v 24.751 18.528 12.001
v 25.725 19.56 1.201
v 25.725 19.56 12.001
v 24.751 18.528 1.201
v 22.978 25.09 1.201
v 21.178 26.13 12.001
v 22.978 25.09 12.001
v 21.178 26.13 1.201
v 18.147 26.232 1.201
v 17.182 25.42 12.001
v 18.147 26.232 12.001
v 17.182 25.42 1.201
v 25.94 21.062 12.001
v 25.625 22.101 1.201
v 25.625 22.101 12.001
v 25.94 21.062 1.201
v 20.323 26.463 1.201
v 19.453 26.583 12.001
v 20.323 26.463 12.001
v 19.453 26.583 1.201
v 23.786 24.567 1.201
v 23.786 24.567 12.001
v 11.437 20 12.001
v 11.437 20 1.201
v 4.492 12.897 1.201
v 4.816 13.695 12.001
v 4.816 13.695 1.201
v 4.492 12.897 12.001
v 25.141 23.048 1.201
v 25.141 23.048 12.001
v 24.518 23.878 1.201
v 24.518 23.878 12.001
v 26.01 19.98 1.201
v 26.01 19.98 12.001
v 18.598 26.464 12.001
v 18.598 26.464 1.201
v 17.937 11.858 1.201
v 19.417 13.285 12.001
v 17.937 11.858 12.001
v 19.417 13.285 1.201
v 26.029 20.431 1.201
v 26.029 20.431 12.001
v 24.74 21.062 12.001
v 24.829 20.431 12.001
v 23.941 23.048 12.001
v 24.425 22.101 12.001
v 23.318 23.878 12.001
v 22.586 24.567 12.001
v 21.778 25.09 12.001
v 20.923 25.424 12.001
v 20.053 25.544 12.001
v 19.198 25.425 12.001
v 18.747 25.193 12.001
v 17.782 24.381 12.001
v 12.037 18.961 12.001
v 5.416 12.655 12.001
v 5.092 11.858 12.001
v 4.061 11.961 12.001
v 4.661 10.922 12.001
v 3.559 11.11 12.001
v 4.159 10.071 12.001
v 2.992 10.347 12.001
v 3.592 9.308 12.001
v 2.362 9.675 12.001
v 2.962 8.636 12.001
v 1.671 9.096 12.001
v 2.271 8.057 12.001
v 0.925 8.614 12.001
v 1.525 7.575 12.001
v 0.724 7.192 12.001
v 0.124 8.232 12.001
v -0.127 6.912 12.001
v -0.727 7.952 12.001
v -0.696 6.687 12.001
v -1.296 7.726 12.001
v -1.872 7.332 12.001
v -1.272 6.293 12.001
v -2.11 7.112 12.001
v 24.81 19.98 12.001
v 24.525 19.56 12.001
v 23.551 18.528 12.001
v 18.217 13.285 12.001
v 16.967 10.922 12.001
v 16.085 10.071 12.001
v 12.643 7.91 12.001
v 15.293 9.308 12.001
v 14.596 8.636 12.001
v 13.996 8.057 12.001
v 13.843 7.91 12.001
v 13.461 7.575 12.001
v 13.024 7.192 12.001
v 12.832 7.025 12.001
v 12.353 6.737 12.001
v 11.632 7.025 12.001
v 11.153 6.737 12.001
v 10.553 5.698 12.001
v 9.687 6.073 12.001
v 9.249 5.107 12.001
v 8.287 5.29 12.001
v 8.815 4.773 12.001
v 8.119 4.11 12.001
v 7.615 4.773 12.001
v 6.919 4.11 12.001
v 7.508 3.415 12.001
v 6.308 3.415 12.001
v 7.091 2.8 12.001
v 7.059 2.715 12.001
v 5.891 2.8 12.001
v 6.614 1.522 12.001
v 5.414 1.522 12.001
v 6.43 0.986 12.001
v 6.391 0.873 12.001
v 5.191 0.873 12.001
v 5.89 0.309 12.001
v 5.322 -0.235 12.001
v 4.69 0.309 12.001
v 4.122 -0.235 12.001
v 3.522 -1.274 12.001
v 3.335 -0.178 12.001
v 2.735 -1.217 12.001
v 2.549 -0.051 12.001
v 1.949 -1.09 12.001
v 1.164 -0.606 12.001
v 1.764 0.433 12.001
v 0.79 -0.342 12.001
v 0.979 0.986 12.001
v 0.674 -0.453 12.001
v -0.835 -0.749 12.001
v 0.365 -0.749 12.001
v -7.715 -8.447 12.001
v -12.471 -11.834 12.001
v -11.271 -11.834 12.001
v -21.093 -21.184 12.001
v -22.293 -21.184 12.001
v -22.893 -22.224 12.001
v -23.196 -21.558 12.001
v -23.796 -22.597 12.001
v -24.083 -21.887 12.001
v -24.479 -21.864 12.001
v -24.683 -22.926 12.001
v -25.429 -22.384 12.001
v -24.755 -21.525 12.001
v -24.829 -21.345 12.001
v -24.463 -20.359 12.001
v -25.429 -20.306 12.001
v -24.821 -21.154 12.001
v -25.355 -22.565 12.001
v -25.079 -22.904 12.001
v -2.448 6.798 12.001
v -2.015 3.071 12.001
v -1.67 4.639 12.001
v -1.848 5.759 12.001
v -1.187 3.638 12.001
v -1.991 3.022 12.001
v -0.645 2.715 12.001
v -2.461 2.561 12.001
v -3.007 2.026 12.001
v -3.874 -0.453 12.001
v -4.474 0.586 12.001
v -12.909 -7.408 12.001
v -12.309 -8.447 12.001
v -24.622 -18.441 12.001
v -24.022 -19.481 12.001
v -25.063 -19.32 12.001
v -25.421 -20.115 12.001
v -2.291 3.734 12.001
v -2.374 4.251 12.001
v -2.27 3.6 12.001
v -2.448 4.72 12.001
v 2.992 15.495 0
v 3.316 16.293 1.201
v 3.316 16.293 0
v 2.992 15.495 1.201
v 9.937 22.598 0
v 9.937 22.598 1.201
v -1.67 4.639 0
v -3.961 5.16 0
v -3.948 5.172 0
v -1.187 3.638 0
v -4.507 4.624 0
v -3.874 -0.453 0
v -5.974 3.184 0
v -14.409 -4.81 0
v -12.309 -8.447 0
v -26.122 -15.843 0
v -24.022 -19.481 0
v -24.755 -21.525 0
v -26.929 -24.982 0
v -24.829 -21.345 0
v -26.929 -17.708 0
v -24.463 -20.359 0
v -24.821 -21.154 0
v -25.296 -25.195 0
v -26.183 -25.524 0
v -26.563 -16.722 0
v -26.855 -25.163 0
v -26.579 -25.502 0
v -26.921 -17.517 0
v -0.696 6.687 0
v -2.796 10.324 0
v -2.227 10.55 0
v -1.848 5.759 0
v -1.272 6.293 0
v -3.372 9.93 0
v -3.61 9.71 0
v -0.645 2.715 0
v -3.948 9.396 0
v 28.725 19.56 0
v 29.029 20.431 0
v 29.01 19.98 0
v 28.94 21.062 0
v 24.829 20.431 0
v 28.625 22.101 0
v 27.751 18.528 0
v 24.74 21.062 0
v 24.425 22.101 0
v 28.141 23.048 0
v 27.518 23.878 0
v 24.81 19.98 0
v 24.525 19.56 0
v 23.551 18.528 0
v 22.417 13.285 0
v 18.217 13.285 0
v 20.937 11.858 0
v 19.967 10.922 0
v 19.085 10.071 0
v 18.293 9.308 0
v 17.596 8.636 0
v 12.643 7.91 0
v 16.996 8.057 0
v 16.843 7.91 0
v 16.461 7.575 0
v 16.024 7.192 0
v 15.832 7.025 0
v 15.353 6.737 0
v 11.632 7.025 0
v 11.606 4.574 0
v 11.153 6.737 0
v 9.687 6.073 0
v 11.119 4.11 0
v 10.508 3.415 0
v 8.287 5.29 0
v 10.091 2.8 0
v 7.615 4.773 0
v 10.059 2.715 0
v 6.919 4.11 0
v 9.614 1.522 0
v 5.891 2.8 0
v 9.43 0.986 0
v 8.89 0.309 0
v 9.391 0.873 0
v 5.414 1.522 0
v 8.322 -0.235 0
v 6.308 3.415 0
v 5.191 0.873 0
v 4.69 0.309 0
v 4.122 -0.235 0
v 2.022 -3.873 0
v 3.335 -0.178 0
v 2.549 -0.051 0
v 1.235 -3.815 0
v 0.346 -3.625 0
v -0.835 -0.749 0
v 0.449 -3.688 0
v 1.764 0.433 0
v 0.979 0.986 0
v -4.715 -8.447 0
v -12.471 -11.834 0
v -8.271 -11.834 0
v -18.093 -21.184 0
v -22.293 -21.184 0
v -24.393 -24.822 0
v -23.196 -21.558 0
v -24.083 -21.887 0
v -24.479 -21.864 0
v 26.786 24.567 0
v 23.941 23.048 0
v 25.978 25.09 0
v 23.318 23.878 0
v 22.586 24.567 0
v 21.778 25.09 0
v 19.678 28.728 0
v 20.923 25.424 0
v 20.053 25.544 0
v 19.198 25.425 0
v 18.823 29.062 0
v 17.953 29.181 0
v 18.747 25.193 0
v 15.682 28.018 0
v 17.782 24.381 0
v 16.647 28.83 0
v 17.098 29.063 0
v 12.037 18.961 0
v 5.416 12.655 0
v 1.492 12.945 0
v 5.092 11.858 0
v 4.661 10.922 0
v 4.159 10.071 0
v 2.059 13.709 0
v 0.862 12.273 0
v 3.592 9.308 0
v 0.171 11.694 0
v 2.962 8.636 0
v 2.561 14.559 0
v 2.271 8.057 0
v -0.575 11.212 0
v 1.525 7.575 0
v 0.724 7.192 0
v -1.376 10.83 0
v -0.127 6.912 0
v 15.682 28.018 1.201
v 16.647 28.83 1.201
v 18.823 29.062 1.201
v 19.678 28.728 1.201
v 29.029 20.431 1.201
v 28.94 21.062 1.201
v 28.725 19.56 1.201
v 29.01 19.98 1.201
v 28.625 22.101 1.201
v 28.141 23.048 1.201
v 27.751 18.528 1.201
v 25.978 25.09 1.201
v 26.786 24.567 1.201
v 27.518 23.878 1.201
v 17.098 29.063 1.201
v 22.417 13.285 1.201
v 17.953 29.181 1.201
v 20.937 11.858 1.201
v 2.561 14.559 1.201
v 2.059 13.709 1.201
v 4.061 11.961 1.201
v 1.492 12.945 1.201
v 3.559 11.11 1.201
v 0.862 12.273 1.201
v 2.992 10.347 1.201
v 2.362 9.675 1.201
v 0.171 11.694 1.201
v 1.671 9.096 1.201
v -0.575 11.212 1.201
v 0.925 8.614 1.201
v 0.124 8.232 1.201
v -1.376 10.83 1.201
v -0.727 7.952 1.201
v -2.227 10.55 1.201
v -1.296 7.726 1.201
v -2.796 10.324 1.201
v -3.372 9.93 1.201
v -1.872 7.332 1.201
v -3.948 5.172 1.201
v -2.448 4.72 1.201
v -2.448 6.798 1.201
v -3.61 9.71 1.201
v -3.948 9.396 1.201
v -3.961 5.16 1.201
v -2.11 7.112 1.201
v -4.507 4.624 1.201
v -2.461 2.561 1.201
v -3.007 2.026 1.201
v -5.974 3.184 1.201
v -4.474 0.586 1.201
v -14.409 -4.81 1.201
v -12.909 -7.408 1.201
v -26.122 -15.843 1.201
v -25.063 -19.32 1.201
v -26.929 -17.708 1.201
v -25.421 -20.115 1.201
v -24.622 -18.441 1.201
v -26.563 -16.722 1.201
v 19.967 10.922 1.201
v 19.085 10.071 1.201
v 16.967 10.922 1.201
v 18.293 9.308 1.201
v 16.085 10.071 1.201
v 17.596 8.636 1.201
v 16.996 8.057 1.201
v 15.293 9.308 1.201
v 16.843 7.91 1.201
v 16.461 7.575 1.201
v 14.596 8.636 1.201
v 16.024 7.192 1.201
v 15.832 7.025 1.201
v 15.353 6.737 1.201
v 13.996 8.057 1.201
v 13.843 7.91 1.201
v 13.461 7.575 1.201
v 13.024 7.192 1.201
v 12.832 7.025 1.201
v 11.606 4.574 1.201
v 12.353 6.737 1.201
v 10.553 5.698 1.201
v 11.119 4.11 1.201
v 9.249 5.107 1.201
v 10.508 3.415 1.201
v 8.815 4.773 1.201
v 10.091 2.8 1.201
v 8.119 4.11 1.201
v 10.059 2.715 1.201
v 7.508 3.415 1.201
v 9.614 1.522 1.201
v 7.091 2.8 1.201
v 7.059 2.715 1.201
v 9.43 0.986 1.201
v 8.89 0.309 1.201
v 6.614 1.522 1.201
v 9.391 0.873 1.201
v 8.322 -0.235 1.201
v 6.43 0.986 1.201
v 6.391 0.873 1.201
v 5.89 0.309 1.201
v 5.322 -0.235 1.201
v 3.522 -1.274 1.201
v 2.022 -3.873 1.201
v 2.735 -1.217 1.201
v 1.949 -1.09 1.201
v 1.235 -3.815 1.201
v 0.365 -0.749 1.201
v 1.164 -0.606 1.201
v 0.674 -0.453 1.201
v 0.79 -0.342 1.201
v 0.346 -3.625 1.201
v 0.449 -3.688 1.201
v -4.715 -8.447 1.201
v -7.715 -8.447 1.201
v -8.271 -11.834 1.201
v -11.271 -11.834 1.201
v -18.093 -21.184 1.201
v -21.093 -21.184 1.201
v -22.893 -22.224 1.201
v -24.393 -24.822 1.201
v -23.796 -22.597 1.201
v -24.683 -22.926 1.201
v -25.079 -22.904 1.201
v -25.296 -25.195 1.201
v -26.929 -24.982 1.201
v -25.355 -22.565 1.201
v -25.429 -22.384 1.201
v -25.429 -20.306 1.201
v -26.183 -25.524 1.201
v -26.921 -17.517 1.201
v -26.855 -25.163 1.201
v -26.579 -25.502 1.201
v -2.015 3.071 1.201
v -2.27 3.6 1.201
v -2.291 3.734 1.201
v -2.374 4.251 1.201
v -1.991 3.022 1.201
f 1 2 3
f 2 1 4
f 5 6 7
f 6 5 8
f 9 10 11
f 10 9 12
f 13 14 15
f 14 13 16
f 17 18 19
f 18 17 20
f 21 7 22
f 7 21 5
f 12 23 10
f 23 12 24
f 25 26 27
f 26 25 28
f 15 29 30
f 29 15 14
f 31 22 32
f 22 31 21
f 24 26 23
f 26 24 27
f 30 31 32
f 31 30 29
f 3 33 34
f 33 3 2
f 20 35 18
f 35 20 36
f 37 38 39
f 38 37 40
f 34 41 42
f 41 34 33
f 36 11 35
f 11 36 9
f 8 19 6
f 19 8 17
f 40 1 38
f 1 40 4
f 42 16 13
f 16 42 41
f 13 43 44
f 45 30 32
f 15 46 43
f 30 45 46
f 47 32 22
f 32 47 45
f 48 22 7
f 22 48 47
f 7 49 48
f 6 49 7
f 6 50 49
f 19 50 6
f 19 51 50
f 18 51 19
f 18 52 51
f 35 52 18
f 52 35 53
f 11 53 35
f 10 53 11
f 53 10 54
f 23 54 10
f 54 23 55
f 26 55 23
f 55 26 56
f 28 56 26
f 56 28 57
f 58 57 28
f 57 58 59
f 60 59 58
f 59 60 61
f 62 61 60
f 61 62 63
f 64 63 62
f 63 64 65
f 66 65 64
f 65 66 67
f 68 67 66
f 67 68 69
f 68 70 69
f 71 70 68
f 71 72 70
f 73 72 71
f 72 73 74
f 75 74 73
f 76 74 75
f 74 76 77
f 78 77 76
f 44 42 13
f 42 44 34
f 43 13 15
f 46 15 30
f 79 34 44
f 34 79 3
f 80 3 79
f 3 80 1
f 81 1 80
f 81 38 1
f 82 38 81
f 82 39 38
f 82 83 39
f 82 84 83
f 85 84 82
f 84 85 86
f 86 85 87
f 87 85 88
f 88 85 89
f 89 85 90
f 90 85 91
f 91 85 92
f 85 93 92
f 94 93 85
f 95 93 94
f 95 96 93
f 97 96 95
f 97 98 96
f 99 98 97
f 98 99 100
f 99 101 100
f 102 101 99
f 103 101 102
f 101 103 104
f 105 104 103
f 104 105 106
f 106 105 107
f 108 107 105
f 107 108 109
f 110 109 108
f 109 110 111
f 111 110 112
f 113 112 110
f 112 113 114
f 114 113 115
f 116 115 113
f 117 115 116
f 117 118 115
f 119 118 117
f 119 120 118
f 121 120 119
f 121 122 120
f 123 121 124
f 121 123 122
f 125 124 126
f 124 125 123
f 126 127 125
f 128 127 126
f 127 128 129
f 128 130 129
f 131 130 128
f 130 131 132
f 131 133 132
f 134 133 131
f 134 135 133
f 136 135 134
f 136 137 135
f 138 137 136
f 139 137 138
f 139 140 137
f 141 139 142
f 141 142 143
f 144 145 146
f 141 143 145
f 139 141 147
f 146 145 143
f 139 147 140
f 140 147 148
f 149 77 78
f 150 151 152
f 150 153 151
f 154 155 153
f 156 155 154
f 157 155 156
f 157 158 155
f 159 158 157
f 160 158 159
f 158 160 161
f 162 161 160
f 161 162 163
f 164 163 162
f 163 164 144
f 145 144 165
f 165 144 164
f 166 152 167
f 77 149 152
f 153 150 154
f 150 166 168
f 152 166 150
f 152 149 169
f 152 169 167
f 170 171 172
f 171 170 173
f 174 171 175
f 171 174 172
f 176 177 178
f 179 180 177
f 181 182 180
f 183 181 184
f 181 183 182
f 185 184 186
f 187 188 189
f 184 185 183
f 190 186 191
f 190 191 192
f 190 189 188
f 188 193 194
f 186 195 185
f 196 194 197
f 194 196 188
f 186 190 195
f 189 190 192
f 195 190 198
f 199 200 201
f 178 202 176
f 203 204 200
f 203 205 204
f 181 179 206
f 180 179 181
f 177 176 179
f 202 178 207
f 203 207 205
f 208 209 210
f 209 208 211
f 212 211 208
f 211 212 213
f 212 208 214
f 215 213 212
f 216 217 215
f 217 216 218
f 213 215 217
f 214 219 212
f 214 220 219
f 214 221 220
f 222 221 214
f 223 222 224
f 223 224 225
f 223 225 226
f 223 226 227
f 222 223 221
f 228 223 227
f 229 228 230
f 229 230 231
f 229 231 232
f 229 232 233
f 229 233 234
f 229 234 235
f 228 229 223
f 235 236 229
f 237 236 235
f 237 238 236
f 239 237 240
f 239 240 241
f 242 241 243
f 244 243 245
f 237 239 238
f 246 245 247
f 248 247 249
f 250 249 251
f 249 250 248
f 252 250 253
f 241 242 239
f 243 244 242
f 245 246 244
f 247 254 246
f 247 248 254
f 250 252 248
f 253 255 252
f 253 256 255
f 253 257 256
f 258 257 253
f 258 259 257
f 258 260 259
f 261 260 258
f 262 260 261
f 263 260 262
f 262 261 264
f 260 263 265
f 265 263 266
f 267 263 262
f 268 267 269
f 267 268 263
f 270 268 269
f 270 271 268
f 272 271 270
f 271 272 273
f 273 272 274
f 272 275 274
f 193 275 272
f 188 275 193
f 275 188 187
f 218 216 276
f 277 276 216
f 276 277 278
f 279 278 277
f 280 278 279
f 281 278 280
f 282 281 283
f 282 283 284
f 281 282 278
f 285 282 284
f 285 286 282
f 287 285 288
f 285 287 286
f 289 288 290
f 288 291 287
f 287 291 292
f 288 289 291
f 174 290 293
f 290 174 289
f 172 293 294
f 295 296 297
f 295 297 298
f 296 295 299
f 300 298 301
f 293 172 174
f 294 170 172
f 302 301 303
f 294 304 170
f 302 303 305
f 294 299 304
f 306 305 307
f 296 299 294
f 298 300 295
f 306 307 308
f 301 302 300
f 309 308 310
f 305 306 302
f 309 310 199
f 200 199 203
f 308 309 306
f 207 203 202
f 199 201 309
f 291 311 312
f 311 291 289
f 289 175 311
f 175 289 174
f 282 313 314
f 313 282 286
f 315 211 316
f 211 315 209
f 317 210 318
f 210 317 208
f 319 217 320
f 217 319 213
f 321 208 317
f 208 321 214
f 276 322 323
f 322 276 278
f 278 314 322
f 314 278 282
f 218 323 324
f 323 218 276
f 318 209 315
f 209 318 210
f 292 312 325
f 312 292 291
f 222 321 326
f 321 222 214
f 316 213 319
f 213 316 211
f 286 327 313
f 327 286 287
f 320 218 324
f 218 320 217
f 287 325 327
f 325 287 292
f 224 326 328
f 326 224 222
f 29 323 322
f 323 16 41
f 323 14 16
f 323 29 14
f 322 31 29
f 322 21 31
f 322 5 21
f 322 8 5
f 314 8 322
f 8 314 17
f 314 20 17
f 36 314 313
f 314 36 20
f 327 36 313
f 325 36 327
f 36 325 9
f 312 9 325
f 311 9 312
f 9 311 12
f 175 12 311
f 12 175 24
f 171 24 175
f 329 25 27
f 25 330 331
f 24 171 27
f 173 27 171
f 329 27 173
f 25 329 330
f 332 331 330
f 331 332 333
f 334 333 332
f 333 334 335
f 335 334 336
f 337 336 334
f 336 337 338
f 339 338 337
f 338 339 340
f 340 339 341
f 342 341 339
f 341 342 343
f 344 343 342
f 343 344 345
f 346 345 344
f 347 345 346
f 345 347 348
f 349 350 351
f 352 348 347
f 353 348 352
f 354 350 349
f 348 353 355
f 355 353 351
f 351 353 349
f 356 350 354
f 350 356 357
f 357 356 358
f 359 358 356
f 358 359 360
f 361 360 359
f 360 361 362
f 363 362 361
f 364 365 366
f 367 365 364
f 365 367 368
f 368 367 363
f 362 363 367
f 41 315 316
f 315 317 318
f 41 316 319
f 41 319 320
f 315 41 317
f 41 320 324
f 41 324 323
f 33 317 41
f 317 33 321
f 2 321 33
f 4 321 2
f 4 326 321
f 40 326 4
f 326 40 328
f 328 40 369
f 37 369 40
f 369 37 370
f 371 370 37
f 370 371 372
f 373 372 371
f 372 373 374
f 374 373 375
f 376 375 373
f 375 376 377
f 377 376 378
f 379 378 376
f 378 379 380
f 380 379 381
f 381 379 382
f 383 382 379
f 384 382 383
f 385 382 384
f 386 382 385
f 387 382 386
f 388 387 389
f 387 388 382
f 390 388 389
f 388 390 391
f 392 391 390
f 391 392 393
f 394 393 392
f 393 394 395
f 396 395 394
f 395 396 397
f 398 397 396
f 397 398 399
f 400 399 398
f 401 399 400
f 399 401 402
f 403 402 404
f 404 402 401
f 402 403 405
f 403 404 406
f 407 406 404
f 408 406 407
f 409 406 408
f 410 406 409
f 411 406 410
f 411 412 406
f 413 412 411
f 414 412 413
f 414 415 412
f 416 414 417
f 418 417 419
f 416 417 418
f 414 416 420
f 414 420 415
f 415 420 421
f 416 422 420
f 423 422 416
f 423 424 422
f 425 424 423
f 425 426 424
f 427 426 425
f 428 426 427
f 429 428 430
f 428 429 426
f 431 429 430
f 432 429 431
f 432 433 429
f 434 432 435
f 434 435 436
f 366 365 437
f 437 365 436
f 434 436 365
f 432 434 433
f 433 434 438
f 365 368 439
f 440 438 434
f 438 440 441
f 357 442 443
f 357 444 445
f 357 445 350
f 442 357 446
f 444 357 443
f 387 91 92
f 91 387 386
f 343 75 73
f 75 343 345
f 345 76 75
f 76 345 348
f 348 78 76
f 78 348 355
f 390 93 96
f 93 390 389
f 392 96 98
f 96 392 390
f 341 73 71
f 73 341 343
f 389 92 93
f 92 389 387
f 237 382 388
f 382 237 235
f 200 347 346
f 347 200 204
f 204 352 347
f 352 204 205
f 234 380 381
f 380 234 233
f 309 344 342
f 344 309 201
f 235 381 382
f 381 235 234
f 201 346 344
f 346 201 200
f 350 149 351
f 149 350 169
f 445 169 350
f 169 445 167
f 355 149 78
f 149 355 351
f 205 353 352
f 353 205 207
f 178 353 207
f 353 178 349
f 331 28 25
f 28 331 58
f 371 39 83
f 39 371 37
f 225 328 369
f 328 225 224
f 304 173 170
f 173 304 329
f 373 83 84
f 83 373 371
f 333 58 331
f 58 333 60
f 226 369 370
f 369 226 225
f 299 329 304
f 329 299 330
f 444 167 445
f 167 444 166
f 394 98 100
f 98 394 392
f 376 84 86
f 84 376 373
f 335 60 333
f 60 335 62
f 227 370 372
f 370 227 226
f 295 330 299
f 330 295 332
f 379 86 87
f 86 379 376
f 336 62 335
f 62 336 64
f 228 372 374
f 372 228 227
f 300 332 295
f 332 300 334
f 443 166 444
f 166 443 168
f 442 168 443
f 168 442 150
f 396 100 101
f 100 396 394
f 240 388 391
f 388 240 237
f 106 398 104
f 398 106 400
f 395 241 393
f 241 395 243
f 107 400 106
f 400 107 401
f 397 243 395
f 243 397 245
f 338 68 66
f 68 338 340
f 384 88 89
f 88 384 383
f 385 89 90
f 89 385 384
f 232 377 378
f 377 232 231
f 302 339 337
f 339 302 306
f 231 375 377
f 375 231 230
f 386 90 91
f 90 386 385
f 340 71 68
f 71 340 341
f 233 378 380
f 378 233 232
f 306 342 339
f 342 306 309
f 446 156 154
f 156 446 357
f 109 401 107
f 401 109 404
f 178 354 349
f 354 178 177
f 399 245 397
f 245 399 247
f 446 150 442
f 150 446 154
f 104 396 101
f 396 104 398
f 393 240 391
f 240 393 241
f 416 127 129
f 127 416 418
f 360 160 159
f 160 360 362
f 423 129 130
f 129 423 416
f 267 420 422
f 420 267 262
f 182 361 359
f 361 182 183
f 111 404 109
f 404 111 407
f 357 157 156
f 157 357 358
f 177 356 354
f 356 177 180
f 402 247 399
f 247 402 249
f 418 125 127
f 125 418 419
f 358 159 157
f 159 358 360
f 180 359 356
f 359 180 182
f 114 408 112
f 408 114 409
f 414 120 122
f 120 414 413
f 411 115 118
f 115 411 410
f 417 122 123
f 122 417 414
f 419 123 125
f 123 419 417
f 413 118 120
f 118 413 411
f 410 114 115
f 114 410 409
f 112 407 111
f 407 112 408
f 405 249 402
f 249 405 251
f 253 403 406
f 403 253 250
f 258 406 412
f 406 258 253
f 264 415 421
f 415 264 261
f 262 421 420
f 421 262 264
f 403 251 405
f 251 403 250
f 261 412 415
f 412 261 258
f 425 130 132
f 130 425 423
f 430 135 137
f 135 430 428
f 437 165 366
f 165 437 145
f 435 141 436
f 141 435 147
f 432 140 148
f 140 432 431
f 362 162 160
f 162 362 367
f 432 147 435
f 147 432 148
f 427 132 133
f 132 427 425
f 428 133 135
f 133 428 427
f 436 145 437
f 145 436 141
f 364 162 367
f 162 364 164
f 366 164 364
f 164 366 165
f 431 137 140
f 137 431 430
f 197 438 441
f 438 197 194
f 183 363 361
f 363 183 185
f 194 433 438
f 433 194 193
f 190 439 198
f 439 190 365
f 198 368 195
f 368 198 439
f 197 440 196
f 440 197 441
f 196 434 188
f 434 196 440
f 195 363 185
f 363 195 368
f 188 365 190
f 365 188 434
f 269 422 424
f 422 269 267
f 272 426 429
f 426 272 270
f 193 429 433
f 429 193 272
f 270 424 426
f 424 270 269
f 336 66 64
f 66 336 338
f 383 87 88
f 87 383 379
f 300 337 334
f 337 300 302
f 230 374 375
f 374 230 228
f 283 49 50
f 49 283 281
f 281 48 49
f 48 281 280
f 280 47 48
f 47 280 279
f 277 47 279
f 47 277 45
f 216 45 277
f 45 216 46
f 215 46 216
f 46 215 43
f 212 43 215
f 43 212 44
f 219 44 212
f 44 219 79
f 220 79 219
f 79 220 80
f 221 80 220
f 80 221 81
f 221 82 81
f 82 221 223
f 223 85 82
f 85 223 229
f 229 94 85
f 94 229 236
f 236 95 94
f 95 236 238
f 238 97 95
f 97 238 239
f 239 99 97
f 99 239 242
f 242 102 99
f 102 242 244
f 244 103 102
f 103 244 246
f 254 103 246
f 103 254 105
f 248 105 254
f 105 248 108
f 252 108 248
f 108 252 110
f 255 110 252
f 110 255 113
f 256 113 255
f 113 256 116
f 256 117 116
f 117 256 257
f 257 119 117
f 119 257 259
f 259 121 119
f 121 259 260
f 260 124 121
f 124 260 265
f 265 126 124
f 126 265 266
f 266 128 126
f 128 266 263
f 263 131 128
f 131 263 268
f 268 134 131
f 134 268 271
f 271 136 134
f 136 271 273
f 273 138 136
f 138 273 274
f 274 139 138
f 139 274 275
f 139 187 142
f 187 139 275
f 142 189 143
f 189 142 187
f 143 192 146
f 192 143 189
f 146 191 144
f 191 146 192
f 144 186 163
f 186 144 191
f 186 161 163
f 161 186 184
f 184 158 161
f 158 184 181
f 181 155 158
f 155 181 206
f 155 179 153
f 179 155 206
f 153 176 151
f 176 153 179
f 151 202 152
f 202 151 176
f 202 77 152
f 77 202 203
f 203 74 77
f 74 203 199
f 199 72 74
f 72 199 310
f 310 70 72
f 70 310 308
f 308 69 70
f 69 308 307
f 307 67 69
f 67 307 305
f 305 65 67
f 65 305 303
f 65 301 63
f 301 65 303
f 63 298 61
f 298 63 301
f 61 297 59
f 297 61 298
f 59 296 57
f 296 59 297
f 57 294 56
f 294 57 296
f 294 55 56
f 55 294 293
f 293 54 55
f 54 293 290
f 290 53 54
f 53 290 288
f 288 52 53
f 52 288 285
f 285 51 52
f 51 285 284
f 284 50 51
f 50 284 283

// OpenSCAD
// Module names are of the form poly_<inkscape-path-id>().  As a result,
// you can associate a polygon in this OpenSCAD program with the corresponding
// SVG element in the Inkscape document by looking for the XML element with
// the attribute id="inkscape-path-id".

// fudge value is used to ensure that subtracted solids are a tad taller
// in the z dimension than the polygon being subtracted from.  This helps
// keep the resulting .stl file manifold.
fudge = 0.1;

			
			    /// Global parameters
grid = false ;   //Use grid for multi elements cutters
full= false ;  //For build full or empty objects (see instuctables for details)
borderThick = 1.20000004768  ;    //border thickness (mm)
h=   12.0  ;    //total height of the cookie cutter (mm)
borderType=  1   ;    //type of border, 0 none, 1-classic, 2-cone
Lreb = 3.0;     //Width of border (en mm)
Hreb = 1.20000004768 ;    //Thickness of border (mm)




                /// Grid parameters
gridX=300;      //Maximum X dimension Change only if you build cookies bigger than 30cm
gridY=300;      //Maximum Y dimension Change only if you build cookies bigger than 30cm
meshSolid=1.20000004768;    //width of solid part of grid
meshSpace=8.0;    //width of blank part of grid 
gridThickness=Hreb; //thickness of grid
moveGridX=0;    //X shift for adujustments
moveGridY=0;    //Y shift for adjustments
rotateGridZ=45.0;  //Z rotation for adjtments
$fn = 0.1;



module poly_path21(h)
{
  scale([25.4/90, -25.4/90, 1]) union()
  {
    linear_extrude(height=h)
      polygon([[-86.738047,77.472593],[-87.714445,76.271133],[-87.976726,75.631932],[-87.948216,74.955859],[-86.679530,72.138133],[-85.116610,69.026173],[-43.614171,29.930083],[-13.728434,1.605267],[-2.285520,-9.618905],[-4.207388,-12.890265],[-5.916057,-16.437524],[-6.549233,-20.406215],[-4.507905,-22.298435],[-2.466267,-23.693127],[-0.450960,-24.492785],[2.564932,-25.485005],[5.401806,-26.840492],[8.048600,-28.548767],[10.494256,-30.599352],[12.727713,-32.981768],[14.737911,-35.685537],[16.513790,-38.700181],[18.044290,-42.015221],[19.190910,-44.842131],[42.650630,-67.183994],[63.007009,-86.388885],[66.425113,-89.267030],[68.025160,-90.089339],[71.052677,-90.510110],[74.135698,-90.085948],[77.164608,-88.903150],[80.029795,-87.048016],[82.621644,-84.606844],[84.830542,-81.665932],[86.546875,-78.311577],[87.661030,-74.630080],[87.976726,-72.393690],[87.908370,-70.793522],[86.899201,-69.308529],[83.447060,-65.649334],[64.549630,-47.071591],[44.797496,-28.025936],[41.216605,-24.891836],[39.517430,-23.871235],[34.322301,-21.517837],[29.362800,-18.745145],[26.981437,-16.911764],[24.516226,-14.563141],[22.351970,-12.099290],[20.873470,-9.920225],[19.183500,-5.393645],[18.394814,-3.092775],[16.618910,-1.093217],[14.604800,0.833643],[11.818380,0.629383],[9.032633,0.180426],[6.250410,-1.535087],[3.468870,-3.495297],[-2.957610,2.652783],[-44.187749,41.931873],[-78.991405,75.062873],[-82.191956,76.385793],[-85.332526,77.551776],[-86.738047,77.472593]]);
    linear_extrude(height=h)
      polygon([[-39.677476,26.732323],[-60.461926,81.156035],[-63.802283,89.902703],[-64.034253,90.510110],[-63.431132,88.930851],[-39.677476,26.732323]]);
  }
}


module shape(h){ poly_path21(h);

}

//-------------------------------------------------

/// Module grid have been imported from the Openscad grid creator by Glyn
/// Orininaly published on http://www.thingiverse.com/thing:29211
/// Under the terms of Creative Commons By-Sa (08.26.2012)

module grid(meshSolid, meshSpace, gridThickness, gridX, gridY){

meshX=gridX;
meshY=gridY;
nX=meshX/(meshSolid+meshSpace);
nY=meshY/(meshSolid+meshSpace);

for (i=[0:nX]) {
	 	 translate([-(meshX/2)+i*(meshSolid+meshSpace),-meshY/2,-gridThickness/2]) cube(size=[meshSolid,meshY,gridThickness],center=false);
}

for (i=[0:nY]) {
	 	translate([-meshX/2,-(meshY/2)+i*(meshSolid+meshSpace),-gridThickness/2]) cube(size=[meshX,meshSolid,gridThickness],center=false);
    }
}


module rebords(borderType,borderThick,Lreb,Hreb){
if (borderType==0){}
if (borderType==1){
    cylinder(h = Hreb, r=(borderThick+Lreb));} 
if (borderType==2) {
    cylinder(h = Hreb, r1=(borderThick+Lreb),r2=(borderThick));}
}


module borders(h){
cylinder(r=borderThick,h=h);
}



module fullVolume (borderType,borderThick,Lreb,Hreb,h) {
minkowski(){
    shape(0.001);
    union(){
       borders(h);
       rebords(borderType,borderThick,Lreb,Hreb);
    }}}


module finalShape(){
if (full == false){
    difference(){
      fullVolume(borderType,borderThick,Lreb,Hreb,h);
      translate([0,0,(-0.5*h)]) shape(3*h);
}}
else{
          fullVolume(borderType,borderThick,Lreb,Hreb,h);
}
}


if (grid==true){
union (){
  finalShape();
  intersection() {
   translate([moveGridX,moveGridY,(0.5*gridThickness)]) rotate([0,0,rotateGridZ]) grid(meshSolid, meshSpace, gridThickness, gridX, gridY);
    shape();
}}
}
else{
    finalShape();
}

// Enjoy your cookies ! :)
